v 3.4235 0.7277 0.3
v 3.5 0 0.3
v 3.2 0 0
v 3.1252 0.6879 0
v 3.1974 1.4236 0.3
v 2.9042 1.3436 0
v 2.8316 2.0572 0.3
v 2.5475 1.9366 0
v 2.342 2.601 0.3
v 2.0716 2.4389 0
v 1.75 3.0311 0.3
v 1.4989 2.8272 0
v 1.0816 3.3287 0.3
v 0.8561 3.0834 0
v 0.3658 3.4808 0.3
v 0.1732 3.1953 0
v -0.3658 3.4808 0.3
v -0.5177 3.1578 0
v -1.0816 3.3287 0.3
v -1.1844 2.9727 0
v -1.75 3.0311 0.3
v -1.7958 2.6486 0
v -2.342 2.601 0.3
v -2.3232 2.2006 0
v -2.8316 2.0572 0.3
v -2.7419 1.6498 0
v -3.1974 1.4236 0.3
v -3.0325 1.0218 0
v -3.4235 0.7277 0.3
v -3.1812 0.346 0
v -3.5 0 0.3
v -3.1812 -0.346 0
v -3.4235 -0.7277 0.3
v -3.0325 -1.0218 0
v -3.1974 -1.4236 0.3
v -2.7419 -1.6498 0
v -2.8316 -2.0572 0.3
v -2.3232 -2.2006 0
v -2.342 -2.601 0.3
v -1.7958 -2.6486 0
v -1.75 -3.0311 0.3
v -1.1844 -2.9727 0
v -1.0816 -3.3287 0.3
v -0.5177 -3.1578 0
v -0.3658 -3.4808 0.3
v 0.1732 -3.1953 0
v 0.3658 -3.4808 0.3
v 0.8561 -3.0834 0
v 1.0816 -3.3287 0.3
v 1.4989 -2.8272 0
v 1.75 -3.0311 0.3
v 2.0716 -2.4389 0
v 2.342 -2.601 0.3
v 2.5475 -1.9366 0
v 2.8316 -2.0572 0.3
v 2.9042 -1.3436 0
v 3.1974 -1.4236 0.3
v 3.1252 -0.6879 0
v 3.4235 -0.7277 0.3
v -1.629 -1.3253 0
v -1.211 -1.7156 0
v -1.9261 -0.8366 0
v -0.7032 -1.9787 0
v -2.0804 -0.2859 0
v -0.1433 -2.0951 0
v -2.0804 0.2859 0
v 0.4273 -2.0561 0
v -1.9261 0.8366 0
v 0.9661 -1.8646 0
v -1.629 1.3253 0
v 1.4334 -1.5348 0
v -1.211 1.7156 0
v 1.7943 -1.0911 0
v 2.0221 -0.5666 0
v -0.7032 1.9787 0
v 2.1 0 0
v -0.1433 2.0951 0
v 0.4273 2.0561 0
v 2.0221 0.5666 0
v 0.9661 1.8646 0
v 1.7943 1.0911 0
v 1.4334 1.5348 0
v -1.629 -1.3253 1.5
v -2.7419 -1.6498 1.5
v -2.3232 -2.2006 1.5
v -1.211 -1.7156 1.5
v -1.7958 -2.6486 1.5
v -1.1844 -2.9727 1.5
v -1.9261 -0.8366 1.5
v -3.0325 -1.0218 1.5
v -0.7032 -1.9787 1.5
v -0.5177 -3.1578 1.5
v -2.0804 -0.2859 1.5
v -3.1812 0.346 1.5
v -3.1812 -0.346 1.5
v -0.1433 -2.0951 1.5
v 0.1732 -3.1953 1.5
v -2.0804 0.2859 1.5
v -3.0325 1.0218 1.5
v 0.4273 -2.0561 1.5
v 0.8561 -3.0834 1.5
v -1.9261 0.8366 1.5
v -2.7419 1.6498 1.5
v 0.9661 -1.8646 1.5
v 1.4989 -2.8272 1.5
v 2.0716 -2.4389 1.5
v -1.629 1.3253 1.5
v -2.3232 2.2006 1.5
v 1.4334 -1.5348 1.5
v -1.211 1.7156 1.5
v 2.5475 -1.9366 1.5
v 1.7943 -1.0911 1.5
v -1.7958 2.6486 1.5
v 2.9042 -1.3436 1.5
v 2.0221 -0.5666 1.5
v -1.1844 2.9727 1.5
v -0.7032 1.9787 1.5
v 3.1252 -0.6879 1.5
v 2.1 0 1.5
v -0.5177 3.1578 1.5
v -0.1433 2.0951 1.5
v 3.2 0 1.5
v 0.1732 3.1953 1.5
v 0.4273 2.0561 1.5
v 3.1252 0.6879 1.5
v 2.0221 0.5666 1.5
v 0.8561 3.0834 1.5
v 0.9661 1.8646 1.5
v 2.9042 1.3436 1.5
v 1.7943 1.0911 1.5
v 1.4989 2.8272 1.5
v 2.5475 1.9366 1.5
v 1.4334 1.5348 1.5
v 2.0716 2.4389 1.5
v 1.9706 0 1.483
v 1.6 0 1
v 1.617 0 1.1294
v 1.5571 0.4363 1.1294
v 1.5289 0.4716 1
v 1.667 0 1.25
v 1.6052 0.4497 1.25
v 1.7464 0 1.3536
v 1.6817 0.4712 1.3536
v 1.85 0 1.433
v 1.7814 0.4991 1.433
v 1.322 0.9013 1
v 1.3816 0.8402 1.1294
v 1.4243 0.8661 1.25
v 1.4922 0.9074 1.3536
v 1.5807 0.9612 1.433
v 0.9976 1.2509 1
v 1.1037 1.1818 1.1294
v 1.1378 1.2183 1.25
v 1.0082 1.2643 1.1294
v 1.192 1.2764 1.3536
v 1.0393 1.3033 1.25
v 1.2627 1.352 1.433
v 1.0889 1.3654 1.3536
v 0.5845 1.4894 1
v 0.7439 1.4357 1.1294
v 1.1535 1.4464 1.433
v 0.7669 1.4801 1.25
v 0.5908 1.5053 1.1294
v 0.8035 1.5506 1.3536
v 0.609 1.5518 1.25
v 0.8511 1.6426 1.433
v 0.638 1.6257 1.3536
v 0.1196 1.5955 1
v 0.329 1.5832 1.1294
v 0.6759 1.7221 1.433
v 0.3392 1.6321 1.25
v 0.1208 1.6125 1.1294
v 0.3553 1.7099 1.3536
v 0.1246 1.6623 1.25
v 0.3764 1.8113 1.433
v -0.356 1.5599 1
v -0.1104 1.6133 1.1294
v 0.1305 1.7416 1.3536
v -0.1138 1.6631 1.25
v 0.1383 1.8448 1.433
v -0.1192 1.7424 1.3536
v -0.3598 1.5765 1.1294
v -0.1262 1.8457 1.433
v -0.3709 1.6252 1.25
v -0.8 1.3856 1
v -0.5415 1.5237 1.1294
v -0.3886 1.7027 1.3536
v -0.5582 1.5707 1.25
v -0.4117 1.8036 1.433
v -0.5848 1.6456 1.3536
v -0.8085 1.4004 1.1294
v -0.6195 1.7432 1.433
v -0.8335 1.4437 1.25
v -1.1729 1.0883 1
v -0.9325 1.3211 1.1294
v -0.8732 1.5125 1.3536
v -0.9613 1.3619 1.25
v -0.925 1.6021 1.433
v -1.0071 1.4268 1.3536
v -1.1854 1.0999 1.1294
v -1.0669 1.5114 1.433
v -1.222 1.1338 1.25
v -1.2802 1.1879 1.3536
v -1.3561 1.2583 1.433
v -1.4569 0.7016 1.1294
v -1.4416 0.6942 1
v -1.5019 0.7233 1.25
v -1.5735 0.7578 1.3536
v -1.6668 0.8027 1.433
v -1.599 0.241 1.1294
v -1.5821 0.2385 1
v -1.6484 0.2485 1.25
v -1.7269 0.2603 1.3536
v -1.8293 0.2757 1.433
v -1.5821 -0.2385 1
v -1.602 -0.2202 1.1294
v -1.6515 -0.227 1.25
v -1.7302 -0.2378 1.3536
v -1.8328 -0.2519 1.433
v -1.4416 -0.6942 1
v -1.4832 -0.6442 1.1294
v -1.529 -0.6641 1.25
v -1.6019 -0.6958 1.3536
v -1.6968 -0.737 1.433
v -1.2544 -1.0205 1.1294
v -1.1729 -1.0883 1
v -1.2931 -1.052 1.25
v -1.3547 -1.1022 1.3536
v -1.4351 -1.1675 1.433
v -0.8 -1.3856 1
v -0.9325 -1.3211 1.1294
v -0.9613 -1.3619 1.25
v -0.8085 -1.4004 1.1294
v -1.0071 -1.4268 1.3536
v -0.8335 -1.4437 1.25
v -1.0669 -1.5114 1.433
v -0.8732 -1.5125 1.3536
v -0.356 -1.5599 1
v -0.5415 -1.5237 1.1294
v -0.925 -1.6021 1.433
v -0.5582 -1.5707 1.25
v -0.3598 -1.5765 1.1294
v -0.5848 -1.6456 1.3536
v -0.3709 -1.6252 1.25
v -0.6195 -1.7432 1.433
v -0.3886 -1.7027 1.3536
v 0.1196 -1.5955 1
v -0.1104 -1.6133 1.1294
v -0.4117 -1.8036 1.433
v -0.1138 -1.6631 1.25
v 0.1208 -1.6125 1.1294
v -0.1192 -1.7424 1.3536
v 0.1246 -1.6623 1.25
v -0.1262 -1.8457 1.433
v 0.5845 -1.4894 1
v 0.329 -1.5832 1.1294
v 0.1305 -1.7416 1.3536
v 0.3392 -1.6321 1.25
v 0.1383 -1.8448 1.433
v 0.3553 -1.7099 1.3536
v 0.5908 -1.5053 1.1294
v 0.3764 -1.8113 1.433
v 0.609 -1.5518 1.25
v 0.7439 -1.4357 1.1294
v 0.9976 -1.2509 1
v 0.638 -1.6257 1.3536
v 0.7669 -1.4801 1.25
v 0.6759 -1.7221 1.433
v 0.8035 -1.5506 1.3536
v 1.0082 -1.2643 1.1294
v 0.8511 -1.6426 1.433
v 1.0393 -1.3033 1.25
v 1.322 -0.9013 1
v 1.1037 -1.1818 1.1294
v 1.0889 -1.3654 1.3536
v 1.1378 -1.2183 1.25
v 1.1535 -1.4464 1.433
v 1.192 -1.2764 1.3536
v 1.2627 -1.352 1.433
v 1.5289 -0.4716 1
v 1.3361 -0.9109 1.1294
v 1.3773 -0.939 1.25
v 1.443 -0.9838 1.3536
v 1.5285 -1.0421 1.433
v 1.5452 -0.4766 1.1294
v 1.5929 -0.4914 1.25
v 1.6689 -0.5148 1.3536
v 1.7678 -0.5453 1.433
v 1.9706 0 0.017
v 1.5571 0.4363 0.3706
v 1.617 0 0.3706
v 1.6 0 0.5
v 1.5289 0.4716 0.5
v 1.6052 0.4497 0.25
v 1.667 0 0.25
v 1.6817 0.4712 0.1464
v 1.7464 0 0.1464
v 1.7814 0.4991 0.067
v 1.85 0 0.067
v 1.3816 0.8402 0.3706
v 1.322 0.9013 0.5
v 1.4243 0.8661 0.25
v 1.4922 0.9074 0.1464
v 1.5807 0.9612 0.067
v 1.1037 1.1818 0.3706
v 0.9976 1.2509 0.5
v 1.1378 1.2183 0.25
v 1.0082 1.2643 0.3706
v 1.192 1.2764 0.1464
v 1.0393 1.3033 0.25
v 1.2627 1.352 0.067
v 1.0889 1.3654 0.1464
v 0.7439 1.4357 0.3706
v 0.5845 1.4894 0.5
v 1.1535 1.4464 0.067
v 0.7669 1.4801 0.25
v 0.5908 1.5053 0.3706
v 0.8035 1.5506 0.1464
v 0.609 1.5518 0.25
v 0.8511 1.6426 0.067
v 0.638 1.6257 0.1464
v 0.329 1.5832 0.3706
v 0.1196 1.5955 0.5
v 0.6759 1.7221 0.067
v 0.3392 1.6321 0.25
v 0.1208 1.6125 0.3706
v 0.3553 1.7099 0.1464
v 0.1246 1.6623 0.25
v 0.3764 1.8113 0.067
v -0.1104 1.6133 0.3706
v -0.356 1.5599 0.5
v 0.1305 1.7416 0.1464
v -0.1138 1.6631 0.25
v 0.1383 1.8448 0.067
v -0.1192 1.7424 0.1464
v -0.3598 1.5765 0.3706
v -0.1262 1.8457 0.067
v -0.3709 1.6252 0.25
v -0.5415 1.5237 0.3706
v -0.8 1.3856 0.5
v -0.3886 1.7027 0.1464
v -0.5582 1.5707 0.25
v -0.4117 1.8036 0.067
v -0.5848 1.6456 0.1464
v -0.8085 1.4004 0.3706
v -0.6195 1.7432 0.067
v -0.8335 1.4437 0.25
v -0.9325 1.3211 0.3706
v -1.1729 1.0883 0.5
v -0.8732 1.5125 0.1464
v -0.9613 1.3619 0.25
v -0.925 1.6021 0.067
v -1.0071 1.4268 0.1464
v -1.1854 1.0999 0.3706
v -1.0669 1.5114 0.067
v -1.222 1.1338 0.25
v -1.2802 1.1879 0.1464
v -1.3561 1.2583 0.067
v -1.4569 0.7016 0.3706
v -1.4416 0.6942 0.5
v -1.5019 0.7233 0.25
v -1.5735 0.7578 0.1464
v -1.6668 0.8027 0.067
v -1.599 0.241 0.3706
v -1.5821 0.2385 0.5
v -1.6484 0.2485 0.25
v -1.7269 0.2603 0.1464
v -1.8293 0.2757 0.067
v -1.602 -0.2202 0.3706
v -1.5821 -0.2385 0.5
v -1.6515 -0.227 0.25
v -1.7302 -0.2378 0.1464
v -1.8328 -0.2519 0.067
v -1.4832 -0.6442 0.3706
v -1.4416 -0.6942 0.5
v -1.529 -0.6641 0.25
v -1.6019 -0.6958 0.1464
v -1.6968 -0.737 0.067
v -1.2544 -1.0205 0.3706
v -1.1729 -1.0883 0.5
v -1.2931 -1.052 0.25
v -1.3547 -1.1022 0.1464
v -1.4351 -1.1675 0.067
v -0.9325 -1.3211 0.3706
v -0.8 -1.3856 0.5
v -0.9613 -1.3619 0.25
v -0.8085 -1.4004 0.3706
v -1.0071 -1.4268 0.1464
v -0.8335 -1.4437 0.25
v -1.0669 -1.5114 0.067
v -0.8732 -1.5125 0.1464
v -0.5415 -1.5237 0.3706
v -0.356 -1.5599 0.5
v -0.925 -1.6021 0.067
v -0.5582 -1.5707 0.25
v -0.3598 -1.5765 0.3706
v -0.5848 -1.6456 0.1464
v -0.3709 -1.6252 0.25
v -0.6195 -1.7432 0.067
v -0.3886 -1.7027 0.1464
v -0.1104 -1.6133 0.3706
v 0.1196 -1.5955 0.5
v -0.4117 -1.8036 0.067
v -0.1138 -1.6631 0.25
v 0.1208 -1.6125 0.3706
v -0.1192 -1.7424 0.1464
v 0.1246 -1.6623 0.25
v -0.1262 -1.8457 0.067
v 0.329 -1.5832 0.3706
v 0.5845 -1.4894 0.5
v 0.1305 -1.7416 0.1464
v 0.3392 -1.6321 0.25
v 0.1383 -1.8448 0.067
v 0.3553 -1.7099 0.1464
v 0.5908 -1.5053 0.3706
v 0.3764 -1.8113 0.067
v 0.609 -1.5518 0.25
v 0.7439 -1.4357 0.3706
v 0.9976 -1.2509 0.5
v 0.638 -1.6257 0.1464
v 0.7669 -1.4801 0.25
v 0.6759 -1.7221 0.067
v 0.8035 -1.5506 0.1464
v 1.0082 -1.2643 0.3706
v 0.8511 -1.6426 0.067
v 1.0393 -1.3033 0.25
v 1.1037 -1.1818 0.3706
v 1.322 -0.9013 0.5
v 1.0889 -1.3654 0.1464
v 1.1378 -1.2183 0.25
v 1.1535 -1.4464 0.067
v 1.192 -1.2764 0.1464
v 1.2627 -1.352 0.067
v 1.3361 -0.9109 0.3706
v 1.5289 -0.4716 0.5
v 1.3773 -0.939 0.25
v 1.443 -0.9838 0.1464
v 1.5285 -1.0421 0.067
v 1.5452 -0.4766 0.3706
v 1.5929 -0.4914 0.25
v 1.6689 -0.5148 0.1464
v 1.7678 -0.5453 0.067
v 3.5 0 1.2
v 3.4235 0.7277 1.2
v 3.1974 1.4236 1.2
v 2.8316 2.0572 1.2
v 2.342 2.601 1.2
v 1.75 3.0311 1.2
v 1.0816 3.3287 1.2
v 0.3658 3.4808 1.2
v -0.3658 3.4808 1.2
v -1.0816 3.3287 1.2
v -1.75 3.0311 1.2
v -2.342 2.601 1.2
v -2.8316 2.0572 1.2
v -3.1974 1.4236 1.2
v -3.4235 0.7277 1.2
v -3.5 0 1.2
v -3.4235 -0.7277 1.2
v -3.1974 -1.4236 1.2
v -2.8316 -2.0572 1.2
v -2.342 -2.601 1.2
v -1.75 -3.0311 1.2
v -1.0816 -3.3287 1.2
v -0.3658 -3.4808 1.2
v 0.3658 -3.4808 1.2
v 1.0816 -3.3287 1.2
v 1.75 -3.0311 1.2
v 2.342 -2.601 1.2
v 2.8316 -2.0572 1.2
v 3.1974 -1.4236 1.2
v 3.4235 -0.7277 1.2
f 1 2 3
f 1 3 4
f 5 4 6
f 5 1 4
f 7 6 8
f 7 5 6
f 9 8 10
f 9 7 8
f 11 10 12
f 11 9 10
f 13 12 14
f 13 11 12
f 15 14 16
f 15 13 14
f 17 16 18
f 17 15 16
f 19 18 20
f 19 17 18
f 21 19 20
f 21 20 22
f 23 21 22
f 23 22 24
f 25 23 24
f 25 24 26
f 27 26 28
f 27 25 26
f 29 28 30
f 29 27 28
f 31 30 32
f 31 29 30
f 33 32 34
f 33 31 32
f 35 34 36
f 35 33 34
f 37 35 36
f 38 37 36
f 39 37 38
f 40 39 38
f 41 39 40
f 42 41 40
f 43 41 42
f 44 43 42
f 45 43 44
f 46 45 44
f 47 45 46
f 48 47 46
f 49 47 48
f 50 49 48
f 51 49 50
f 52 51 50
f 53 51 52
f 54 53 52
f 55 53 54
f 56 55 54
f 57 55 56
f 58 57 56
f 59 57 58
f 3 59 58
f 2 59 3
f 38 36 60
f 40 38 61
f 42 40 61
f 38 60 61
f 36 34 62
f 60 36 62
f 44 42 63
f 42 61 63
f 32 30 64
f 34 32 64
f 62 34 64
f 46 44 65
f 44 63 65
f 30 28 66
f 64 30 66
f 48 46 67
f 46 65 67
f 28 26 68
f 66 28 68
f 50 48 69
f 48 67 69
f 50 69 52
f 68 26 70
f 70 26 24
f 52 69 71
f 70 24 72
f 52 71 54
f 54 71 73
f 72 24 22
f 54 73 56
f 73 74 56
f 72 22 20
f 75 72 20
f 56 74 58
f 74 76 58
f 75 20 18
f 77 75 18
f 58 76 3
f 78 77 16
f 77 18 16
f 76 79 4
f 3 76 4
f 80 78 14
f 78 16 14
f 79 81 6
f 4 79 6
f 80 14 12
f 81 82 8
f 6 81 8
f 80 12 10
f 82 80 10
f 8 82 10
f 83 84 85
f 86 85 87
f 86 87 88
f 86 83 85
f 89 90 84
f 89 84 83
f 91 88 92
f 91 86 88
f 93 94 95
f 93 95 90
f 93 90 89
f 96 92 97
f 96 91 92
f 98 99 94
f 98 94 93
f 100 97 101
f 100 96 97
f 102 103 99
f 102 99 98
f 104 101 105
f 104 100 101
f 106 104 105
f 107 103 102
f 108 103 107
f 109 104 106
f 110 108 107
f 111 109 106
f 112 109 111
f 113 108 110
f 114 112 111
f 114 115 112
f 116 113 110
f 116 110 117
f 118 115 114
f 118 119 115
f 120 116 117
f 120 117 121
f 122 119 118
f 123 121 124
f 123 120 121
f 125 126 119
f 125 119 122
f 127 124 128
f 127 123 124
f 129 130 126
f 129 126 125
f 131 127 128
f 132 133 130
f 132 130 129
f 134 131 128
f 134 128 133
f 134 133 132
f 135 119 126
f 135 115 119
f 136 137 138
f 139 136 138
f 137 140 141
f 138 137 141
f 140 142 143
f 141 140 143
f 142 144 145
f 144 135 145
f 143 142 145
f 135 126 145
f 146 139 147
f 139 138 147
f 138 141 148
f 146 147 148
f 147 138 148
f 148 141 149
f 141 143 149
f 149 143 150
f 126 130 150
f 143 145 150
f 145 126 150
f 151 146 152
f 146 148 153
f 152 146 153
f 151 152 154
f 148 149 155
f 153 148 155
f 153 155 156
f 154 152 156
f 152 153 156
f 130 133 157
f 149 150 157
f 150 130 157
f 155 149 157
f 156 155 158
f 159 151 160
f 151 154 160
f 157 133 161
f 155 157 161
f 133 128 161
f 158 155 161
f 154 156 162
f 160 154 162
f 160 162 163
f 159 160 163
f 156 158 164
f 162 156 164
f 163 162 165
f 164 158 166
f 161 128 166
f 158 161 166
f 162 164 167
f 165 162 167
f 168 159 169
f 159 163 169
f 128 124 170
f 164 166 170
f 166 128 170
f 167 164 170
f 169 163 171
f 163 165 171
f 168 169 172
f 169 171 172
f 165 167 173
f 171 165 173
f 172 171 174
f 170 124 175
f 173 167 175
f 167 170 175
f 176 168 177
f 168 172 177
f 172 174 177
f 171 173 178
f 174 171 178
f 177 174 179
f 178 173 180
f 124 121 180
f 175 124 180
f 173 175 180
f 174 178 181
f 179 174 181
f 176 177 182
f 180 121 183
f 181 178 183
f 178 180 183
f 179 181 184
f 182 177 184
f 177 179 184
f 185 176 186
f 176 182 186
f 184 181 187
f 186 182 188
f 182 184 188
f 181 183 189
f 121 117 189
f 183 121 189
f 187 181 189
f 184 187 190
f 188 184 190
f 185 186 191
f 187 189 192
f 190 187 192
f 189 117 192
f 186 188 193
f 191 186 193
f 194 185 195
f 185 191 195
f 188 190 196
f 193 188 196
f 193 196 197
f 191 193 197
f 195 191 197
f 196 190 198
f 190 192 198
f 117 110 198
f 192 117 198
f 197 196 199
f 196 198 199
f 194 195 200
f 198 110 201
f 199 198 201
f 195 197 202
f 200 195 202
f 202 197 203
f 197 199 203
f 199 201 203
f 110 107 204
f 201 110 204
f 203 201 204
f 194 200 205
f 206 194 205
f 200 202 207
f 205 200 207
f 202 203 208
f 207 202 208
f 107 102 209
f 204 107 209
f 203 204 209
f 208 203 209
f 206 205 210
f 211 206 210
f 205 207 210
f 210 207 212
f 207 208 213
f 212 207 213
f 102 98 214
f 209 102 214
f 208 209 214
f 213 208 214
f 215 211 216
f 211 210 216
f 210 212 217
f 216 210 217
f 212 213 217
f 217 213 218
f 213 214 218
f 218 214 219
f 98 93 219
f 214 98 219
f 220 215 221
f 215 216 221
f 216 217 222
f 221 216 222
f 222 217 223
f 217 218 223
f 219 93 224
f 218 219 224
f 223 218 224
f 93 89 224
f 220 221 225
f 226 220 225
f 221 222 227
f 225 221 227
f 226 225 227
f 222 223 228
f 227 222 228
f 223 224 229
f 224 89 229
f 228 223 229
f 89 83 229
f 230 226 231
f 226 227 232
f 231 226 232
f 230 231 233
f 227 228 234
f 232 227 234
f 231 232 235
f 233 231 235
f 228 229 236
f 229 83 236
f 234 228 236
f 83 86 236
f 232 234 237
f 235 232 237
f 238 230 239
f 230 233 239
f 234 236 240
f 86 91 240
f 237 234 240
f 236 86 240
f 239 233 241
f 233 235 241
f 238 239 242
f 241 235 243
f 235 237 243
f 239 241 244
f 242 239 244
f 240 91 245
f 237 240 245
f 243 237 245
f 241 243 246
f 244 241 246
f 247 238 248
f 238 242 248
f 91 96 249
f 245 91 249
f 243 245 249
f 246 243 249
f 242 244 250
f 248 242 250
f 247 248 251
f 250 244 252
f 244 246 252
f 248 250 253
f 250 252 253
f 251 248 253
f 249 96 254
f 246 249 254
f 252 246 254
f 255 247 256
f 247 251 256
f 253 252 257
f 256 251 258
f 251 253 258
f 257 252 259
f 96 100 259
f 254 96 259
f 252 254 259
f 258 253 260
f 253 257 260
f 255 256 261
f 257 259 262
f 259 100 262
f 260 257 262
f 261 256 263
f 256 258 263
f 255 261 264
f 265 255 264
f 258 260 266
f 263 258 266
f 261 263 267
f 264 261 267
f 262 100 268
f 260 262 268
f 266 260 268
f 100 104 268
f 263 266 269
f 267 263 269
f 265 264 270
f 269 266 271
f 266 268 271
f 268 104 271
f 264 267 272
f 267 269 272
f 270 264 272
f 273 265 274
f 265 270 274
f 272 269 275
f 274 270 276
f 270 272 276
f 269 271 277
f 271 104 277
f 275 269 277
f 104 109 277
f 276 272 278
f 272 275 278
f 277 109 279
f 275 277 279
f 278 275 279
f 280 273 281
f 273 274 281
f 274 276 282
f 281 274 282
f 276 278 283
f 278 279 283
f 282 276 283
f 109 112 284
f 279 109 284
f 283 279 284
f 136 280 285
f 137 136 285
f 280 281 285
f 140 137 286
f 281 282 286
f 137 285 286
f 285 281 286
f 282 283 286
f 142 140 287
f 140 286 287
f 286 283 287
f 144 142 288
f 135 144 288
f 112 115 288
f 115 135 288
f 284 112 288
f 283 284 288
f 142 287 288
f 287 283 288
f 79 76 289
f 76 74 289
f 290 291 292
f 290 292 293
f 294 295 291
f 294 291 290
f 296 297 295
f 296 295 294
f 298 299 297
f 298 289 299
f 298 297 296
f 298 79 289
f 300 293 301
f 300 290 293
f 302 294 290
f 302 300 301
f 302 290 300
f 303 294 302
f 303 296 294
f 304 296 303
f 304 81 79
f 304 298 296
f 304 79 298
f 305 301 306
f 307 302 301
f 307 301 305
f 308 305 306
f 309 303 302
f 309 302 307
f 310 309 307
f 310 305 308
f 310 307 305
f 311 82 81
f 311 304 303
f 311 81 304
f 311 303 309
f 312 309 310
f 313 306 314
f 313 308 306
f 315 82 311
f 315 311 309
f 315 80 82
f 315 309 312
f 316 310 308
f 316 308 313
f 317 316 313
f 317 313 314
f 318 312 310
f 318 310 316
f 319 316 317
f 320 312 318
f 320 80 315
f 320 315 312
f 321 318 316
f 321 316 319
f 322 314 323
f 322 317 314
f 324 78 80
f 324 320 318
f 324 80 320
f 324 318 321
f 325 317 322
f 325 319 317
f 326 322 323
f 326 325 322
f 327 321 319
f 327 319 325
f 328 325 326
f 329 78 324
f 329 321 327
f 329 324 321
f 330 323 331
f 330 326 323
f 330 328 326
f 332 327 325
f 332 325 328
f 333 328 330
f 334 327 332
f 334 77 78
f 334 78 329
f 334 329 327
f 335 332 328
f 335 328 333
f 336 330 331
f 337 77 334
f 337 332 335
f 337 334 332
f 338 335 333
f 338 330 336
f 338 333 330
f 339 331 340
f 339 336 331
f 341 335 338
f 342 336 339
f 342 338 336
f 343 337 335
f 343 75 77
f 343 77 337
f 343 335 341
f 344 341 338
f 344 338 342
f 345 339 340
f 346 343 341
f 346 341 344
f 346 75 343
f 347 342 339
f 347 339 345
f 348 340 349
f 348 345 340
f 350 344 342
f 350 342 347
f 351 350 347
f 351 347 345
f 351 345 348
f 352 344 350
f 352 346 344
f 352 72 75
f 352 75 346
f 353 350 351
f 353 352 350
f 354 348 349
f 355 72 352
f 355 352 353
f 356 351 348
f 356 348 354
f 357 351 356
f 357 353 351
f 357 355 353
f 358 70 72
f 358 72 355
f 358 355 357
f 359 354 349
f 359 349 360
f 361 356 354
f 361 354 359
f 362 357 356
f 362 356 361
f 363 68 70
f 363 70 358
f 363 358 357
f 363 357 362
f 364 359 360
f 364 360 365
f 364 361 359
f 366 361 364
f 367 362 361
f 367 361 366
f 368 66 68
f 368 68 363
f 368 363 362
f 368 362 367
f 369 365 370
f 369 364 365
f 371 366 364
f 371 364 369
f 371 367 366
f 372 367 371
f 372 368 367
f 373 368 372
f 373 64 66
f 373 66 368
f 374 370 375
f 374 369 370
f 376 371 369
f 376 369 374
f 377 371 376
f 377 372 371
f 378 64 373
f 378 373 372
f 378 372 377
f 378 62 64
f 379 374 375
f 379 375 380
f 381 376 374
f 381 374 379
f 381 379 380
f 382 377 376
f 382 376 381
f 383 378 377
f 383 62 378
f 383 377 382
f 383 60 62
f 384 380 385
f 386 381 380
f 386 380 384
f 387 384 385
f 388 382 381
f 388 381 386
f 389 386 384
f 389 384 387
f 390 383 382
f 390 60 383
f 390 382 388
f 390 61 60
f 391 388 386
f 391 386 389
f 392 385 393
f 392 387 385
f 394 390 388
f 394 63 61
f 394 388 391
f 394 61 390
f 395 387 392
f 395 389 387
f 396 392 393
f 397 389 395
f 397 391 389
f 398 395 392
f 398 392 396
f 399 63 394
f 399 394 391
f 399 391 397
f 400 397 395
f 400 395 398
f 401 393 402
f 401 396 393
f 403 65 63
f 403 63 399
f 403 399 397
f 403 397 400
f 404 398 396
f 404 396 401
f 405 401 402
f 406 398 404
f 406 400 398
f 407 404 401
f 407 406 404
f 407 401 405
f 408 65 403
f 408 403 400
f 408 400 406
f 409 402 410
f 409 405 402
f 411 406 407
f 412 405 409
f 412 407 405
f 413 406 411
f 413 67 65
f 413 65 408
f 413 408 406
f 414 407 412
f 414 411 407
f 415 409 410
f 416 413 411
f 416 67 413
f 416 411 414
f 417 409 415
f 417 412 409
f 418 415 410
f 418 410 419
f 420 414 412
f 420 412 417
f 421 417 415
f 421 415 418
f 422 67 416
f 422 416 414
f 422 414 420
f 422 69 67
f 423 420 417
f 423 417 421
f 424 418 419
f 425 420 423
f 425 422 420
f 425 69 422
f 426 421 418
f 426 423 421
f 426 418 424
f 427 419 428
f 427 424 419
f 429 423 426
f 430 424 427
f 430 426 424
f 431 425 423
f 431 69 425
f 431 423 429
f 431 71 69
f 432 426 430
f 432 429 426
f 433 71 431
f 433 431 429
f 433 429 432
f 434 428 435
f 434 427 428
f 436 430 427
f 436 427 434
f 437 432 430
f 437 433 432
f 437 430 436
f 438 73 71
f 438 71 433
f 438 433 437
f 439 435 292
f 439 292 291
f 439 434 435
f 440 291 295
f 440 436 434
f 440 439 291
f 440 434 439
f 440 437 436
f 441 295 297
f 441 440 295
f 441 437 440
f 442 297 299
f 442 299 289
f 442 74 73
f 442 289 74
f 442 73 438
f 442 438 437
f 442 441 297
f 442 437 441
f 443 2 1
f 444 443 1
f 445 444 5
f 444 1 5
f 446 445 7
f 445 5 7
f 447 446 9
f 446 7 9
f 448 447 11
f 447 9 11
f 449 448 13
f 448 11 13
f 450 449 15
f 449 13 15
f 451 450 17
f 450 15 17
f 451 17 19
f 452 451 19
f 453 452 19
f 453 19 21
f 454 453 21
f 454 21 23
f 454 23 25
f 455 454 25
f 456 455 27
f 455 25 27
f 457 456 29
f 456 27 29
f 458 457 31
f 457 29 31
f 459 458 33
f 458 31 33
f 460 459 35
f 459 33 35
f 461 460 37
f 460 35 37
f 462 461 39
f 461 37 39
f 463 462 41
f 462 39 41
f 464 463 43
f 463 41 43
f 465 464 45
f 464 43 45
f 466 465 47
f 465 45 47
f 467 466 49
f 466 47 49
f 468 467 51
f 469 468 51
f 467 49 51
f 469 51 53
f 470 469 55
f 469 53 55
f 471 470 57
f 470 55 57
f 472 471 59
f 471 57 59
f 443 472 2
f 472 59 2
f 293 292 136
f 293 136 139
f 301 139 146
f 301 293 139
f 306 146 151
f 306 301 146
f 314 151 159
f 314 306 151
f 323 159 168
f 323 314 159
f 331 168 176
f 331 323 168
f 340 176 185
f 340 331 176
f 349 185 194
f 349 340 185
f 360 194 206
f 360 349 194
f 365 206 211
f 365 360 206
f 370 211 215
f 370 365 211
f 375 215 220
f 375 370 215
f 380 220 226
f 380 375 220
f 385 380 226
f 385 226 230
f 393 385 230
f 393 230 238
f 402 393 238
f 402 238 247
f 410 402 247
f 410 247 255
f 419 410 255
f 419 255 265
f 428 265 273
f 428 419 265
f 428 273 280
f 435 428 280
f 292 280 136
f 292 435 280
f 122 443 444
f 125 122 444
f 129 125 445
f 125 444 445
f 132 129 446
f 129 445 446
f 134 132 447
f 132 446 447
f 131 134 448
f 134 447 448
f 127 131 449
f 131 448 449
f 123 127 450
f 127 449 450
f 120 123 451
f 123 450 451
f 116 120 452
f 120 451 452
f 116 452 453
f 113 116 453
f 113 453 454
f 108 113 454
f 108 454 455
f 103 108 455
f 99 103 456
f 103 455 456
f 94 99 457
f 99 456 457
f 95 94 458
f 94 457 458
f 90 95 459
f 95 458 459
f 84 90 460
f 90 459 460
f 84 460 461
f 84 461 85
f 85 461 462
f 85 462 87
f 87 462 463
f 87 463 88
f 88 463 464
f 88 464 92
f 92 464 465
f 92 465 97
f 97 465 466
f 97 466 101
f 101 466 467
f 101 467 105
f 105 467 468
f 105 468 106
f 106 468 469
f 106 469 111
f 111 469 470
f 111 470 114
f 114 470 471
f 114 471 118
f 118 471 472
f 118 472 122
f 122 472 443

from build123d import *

# Parameters (mm, degrees)
F0_R     = 3.5
F0_R_2   = 1.6
F1_DEPTH = 1.5
F2_R     = 0.5
F3_SIZE  = 0.3


with BuildPart() as f1:
    # F0 (on Top) → F1 (new body)
    with BuildSketch(Plane.XY):
        Circle(F0_R)
        Circle(F0_R_2, mode=Mode.SUBTRACT)
    extrude(amount=F1_DEPTH)

    # F2
    f2_edges = [f1.edges().sort_by_distance(p)[0] for p in [
        (1.6, 0, 0.75),
        (-1.6, 0, 0),
        (-1.6, 0, 1.5),
    ]]
    fillet(f2_edges, radius=F2_R)

    # F3
    f3_edges = [f1.edges().sort_by_distance(p)[0] for p in [
        (3.5, 0, 0.75),
        (-3.5, 0, 0),
        (-3.5, 0, 1.5),
    ]]
    chamfer(f3_edges, length=F3_SIZE)


solid = f1.part
